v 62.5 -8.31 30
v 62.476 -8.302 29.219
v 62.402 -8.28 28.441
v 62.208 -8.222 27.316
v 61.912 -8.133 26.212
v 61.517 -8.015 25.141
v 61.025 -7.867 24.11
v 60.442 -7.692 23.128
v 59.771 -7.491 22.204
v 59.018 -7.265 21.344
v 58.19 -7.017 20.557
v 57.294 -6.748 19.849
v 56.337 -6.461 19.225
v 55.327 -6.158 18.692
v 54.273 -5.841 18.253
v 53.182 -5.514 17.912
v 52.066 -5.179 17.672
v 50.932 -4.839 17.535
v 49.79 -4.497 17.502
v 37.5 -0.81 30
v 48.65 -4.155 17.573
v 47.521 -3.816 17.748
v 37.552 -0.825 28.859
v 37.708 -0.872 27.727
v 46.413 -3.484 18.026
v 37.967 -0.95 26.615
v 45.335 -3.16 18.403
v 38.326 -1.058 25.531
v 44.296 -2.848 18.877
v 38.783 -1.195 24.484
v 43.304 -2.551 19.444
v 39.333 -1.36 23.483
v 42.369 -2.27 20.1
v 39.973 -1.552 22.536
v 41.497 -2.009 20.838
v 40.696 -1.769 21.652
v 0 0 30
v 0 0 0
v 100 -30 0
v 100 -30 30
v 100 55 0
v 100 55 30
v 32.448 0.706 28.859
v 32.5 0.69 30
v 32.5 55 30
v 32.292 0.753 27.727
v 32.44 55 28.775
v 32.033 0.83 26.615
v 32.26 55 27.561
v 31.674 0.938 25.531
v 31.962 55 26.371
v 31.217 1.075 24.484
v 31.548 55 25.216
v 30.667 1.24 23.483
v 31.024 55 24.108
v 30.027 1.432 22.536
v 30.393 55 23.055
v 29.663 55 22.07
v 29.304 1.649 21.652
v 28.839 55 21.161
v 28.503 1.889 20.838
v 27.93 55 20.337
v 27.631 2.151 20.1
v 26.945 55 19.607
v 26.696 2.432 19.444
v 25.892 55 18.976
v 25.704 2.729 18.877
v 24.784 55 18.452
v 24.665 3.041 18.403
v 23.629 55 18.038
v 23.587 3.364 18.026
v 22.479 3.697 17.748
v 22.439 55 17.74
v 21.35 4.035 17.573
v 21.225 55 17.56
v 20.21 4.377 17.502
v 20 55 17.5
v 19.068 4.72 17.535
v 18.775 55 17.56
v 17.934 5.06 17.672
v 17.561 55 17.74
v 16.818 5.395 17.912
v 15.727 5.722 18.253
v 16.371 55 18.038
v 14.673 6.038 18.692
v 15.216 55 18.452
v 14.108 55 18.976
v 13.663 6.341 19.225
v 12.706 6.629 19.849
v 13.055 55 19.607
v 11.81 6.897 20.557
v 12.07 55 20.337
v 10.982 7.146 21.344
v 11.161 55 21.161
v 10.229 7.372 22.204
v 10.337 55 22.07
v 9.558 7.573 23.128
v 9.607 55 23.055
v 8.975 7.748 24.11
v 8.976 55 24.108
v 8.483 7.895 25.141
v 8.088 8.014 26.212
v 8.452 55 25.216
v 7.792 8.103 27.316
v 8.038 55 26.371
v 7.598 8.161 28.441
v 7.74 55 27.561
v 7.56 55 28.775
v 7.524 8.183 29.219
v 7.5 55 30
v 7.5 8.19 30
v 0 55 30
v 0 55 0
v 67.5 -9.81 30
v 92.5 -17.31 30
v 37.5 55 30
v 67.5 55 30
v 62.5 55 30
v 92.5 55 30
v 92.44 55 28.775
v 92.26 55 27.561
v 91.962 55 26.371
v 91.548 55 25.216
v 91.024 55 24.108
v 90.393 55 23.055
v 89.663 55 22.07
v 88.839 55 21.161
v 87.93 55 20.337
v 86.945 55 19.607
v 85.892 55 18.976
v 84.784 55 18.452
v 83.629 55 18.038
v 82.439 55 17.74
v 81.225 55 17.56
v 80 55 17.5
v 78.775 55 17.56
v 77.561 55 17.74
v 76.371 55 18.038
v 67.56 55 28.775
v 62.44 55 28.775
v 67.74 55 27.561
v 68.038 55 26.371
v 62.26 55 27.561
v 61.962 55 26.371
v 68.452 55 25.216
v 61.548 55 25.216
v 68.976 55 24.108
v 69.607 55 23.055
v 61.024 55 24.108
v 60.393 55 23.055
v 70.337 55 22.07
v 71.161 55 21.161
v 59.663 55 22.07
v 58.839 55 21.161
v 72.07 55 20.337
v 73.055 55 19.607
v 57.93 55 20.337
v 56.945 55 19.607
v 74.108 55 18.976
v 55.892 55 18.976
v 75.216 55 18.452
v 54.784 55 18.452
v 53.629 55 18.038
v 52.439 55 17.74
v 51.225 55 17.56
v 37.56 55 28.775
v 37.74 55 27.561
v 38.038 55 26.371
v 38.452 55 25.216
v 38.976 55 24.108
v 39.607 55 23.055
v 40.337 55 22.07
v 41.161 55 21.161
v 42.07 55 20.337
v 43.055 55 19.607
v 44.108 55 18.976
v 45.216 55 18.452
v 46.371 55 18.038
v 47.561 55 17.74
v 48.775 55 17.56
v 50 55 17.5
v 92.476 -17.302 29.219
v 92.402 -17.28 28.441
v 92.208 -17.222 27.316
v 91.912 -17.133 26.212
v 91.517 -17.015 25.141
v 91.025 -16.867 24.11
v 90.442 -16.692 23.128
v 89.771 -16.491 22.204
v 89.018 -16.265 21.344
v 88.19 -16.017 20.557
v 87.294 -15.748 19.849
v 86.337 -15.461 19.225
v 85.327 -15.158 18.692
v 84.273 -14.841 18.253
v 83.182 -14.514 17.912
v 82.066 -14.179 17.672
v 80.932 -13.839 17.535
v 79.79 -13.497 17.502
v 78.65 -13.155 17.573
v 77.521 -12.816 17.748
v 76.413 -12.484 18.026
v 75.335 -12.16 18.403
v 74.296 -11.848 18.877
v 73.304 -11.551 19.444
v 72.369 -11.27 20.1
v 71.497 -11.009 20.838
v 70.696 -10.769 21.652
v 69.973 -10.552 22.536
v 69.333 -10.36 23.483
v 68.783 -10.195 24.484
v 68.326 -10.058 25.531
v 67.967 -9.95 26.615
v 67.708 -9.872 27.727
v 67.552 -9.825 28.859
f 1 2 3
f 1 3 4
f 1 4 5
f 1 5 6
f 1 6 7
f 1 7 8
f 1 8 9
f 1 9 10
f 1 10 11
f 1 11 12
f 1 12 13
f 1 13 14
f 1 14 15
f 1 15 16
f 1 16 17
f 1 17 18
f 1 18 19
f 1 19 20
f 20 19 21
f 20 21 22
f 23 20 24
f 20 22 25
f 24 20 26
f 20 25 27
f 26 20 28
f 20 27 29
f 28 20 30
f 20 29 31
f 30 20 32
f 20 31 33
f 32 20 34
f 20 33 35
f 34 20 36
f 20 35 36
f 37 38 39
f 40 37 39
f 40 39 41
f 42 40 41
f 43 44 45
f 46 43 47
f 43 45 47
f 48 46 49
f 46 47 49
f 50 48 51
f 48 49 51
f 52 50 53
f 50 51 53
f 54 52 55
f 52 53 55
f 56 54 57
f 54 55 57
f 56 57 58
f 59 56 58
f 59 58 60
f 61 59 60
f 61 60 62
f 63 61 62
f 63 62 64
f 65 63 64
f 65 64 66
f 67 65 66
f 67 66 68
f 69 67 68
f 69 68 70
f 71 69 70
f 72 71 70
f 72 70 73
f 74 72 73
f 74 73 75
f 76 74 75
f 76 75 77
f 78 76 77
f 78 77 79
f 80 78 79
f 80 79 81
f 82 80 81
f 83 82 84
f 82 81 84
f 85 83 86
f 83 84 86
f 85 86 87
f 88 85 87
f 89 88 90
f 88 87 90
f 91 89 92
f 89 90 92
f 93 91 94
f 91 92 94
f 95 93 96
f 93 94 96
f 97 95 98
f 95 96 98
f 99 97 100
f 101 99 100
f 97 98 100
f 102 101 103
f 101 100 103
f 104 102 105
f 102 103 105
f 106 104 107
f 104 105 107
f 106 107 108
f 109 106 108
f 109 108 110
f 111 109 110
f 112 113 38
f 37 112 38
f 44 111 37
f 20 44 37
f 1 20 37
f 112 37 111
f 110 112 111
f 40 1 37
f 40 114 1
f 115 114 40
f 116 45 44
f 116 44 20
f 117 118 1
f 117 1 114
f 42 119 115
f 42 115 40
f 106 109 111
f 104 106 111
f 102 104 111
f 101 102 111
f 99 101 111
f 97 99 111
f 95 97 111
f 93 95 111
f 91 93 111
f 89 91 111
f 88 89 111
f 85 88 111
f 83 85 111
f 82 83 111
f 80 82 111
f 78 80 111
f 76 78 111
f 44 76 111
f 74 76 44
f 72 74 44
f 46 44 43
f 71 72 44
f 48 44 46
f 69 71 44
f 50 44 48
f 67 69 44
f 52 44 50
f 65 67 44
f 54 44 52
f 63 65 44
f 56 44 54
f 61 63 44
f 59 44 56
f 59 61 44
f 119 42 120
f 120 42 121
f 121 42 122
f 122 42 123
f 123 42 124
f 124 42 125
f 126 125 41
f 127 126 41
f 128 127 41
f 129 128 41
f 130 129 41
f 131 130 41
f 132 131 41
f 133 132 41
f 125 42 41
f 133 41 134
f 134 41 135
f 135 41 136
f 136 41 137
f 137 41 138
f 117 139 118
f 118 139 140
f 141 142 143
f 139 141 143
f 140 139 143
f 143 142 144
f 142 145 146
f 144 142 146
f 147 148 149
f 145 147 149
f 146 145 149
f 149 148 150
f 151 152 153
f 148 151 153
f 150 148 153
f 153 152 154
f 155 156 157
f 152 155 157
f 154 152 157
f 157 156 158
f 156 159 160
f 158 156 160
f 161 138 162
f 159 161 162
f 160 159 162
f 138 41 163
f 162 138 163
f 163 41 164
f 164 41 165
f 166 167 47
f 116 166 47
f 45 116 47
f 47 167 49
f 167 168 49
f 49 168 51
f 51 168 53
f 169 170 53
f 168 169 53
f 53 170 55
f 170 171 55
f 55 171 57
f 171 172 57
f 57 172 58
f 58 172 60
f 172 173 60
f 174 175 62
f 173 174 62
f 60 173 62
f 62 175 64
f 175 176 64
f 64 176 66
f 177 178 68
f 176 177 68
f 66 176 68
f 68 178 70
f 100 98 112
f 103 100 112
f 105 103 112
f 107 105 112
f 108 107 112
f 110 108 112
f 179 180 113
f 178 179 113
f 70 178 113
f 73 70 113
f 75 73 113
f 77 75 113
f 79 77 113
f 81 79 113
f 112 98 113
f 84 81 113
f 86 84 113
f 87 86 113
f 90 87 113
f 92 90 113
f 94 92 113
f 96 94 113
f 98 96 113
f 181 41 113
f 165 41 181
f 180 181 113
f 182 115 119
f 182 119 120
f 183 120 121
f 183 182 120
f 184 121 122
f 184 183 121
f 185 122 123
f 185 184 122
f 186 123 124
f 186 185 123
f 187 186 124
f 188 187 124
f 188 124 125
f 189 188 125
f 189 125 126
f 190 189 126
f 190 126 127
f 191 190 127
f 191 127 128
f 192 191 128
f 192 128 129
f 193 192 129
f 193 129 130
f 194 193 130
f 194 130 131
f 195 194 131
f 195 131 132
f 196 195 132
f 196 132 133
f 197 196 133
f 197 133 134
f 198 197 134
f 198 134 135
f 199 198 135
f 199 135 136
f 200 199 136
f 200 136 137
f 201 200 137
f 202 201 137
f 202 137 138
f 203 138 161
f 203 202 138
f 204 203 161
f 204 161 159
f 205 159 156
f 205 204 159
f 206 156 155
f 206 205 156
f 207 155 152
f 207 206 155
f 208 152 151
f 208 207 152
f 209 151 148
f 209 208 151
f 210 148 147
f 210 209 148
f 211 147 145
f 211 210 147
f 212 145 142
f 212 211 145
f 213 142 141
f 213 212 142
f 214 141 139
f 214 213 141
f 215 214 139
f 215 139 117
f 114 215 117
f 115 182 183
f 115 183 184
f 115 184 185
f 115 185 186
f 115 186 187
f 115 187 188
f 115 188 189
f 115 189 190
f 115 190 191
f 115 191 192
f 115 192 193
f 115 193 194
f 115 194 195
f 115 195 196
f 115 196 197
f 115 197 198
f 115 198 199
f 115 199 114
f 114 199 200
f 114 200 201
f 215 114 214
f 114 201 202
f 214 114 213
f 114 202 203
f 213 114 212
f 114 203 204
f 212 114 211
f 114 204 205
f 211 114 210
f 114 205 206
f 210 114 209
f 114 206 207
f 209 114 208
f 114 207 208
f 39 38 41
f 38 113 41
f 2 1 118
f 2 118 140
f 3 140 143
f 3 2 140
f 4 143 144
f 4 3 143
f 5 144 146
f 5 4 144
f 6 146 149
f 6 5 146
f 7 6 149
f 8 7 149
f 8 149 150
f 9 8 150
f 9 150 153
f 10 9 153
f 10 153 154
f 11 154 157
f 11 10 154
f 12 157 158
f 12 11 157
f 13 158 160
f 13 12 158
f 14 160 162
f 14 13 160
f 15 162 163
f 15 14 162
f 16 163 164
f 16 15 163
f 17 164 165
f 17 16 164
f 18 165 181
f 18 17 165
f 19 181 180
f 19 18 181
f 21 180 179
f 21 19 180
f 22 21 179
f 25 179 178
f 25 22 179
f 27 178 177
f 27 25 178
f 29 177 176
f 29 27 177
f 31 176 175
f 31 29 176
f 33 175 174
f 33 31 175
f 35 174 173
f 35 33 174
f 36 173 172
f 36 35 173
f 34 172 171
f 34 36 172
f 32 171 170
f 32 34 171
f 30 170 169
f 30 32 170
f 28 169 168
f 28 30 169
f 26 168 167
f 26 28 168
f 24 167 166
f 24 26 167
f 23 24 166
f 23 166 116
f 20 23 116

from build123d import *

# Parameters (mm, degrees)
EXTRUDE1_DEPTH    = 30
EXTRUDE2_REACH    = 136.629
SKETCH2_R         = 12.5
LPATTERN1_START   = -0.809693491
LPATTERN1_DEPTH   = 55.809693491
LPATTERN1_START_2 = -9.809693491
LPATTERN1_2_DEPTH = 55.831993491
LPATTERN1_START_3 = -17.309693491
LPATTERN1_3_DEPTH = 7.5
LPATTERN1_START_4 = -8.309693491
LPATTERN1_4_DEPTH = 7.5
LPATTERN1_START_5 = 17
LPATTERN1_5_DEPTH = 13


with BuildPart() as part:
    # Sketch1 → Extrude1 (new body)
    with BuildSketch(Plane.XY):
        Polygon((0, 0), (100, -30), (100, 55), (0, 55), align=None)
    extrude(amount=EXTRUDE1_DEPTH)

    # Extrude2: up to this plane
    extrude2_end = Plane(origin=(2.873478856, 9.578262852, 30), z_dir=(0.2873478855663455, 0.9578262852211514, 0))
    # Sketch2 → Extrude2 (cut, up to the surface)
    with BuildSketch(Plane(origin=(0, 55, 0), x_dir=(1, 0, 0), z_dir=(0, 1, 0)), mode=Mode.PRIVATE) as extrude2_sk1:
        with Locations((20, -30)):
            Circle(SKETCH2_R)
    extrude2_tool1 = split(extrude(extrude2_sk1.sketch, amount=-EXTRUDE2_REACH, mode=Mode.PRIVATE), bisect_by=extrude2_end, keep=Keep.BOTH, mode=Mode.PRIVATE)
    add(extrude2_tool1.solids().sort_by_distance((20, 55, 30))[0], mode=Mode.SUBTRACT)

    # LPattern1: read off the stored shape, not the designer's step
    # LPattern1 outline → LPattern1 (cut)
    with BuildSketch(Plane(origin=(0, 0, 0), x_dir=(1, 0, 0), z_dir=(0, 1, 0)).offset(LPATTERN1_START)):
        with BuildLine():
            Line((37.5, -30), (62.5, -30))
            ThreePointArc((62.5, -30), (50, -17.5), (37.5, -30))
        make_face()
        with BuildLine():
            ThreePointArc((92.5, -30), (80, -17.5), (67.5, -30))
            Line((67.5, -30), (92.5, -30))
        make_face()
    extrude(amount=LPATTERN1_DEPTH, mode=Mode.SUBTRACT)

    # LPattern1 2 outline → LPattern1 2 (cut)
    with BuildSketch(Plane(origin=(0, 0, 0), x_dir=(1, 0, 0), z_dir=(0, 1, 0)).offset(LPATTERN1_START_2)):
        with BuildLine():
            ThreePointArc((92.5, -30), (80, -17.5), (67.5, -30))
            Line((67.5, -30), (92.5, -30))
        make_face()
    extrude(amount=LPATTERN1_2_DEPTH, mode=Mode.SUBTRACT)

    # LPattern1 3 outline → LPattern1 3 (cut)
    with BuildSketch(Plane(origin=(0, 0, 0), x_dir=(1, 0, 0), z_dir=(0, 1, 0)).offset(LPATTERN1_START_3)):
        with BuildLine():
            ThreePointArc((92.5, -30), (80, -17.5), (67.5, -30))
            Line((67.5, -30), (92.5, -30))
        make_face()
    extrude(amount=LPATTERN1_3_DEPTH, mode=Mode.SUBTRACT)

    # LPattern1 4 outline → LPattern1 4 (cut)
    with BuildSketch(Plane(origin=(0, 0, 0), x_dir=(1, 0, 0), z_dir=(0, 1, 0)).offset(LPATTERN1_START_4)):
        with BuildLine():
            Line((37.5, -30), (62.5, -30))
            ThreePointArc((62.5, -30), (50, -17.5), (37.5, -30))
        make_face()
    extrude(amount=LPATTERN1_4_DEPTH, mode=Mode.SUBTRACT)

    # LPattern1 5 outline → LPattern1 5 (add)
    with BuildSketch(Plane.XY.offset(LPATTERN1_START_5)):
        Polygon((92.5, 55), (92.5, -17.309693491), (67.5, -9.809693491), (67.5, 55), (62.5, 55), (62.5, -8.309693491), (37.5, -0.809693491), (37.5, 55), (32.5, 55), (32.5, 0.690306509), (7.5, 8.190306509), (7.5, 55), (0, 55), (0, 0), (100, -30), (100, 55), align=None)
    extrude(amount=LPATTERN1_5_DEPTH)


solid = part.part
